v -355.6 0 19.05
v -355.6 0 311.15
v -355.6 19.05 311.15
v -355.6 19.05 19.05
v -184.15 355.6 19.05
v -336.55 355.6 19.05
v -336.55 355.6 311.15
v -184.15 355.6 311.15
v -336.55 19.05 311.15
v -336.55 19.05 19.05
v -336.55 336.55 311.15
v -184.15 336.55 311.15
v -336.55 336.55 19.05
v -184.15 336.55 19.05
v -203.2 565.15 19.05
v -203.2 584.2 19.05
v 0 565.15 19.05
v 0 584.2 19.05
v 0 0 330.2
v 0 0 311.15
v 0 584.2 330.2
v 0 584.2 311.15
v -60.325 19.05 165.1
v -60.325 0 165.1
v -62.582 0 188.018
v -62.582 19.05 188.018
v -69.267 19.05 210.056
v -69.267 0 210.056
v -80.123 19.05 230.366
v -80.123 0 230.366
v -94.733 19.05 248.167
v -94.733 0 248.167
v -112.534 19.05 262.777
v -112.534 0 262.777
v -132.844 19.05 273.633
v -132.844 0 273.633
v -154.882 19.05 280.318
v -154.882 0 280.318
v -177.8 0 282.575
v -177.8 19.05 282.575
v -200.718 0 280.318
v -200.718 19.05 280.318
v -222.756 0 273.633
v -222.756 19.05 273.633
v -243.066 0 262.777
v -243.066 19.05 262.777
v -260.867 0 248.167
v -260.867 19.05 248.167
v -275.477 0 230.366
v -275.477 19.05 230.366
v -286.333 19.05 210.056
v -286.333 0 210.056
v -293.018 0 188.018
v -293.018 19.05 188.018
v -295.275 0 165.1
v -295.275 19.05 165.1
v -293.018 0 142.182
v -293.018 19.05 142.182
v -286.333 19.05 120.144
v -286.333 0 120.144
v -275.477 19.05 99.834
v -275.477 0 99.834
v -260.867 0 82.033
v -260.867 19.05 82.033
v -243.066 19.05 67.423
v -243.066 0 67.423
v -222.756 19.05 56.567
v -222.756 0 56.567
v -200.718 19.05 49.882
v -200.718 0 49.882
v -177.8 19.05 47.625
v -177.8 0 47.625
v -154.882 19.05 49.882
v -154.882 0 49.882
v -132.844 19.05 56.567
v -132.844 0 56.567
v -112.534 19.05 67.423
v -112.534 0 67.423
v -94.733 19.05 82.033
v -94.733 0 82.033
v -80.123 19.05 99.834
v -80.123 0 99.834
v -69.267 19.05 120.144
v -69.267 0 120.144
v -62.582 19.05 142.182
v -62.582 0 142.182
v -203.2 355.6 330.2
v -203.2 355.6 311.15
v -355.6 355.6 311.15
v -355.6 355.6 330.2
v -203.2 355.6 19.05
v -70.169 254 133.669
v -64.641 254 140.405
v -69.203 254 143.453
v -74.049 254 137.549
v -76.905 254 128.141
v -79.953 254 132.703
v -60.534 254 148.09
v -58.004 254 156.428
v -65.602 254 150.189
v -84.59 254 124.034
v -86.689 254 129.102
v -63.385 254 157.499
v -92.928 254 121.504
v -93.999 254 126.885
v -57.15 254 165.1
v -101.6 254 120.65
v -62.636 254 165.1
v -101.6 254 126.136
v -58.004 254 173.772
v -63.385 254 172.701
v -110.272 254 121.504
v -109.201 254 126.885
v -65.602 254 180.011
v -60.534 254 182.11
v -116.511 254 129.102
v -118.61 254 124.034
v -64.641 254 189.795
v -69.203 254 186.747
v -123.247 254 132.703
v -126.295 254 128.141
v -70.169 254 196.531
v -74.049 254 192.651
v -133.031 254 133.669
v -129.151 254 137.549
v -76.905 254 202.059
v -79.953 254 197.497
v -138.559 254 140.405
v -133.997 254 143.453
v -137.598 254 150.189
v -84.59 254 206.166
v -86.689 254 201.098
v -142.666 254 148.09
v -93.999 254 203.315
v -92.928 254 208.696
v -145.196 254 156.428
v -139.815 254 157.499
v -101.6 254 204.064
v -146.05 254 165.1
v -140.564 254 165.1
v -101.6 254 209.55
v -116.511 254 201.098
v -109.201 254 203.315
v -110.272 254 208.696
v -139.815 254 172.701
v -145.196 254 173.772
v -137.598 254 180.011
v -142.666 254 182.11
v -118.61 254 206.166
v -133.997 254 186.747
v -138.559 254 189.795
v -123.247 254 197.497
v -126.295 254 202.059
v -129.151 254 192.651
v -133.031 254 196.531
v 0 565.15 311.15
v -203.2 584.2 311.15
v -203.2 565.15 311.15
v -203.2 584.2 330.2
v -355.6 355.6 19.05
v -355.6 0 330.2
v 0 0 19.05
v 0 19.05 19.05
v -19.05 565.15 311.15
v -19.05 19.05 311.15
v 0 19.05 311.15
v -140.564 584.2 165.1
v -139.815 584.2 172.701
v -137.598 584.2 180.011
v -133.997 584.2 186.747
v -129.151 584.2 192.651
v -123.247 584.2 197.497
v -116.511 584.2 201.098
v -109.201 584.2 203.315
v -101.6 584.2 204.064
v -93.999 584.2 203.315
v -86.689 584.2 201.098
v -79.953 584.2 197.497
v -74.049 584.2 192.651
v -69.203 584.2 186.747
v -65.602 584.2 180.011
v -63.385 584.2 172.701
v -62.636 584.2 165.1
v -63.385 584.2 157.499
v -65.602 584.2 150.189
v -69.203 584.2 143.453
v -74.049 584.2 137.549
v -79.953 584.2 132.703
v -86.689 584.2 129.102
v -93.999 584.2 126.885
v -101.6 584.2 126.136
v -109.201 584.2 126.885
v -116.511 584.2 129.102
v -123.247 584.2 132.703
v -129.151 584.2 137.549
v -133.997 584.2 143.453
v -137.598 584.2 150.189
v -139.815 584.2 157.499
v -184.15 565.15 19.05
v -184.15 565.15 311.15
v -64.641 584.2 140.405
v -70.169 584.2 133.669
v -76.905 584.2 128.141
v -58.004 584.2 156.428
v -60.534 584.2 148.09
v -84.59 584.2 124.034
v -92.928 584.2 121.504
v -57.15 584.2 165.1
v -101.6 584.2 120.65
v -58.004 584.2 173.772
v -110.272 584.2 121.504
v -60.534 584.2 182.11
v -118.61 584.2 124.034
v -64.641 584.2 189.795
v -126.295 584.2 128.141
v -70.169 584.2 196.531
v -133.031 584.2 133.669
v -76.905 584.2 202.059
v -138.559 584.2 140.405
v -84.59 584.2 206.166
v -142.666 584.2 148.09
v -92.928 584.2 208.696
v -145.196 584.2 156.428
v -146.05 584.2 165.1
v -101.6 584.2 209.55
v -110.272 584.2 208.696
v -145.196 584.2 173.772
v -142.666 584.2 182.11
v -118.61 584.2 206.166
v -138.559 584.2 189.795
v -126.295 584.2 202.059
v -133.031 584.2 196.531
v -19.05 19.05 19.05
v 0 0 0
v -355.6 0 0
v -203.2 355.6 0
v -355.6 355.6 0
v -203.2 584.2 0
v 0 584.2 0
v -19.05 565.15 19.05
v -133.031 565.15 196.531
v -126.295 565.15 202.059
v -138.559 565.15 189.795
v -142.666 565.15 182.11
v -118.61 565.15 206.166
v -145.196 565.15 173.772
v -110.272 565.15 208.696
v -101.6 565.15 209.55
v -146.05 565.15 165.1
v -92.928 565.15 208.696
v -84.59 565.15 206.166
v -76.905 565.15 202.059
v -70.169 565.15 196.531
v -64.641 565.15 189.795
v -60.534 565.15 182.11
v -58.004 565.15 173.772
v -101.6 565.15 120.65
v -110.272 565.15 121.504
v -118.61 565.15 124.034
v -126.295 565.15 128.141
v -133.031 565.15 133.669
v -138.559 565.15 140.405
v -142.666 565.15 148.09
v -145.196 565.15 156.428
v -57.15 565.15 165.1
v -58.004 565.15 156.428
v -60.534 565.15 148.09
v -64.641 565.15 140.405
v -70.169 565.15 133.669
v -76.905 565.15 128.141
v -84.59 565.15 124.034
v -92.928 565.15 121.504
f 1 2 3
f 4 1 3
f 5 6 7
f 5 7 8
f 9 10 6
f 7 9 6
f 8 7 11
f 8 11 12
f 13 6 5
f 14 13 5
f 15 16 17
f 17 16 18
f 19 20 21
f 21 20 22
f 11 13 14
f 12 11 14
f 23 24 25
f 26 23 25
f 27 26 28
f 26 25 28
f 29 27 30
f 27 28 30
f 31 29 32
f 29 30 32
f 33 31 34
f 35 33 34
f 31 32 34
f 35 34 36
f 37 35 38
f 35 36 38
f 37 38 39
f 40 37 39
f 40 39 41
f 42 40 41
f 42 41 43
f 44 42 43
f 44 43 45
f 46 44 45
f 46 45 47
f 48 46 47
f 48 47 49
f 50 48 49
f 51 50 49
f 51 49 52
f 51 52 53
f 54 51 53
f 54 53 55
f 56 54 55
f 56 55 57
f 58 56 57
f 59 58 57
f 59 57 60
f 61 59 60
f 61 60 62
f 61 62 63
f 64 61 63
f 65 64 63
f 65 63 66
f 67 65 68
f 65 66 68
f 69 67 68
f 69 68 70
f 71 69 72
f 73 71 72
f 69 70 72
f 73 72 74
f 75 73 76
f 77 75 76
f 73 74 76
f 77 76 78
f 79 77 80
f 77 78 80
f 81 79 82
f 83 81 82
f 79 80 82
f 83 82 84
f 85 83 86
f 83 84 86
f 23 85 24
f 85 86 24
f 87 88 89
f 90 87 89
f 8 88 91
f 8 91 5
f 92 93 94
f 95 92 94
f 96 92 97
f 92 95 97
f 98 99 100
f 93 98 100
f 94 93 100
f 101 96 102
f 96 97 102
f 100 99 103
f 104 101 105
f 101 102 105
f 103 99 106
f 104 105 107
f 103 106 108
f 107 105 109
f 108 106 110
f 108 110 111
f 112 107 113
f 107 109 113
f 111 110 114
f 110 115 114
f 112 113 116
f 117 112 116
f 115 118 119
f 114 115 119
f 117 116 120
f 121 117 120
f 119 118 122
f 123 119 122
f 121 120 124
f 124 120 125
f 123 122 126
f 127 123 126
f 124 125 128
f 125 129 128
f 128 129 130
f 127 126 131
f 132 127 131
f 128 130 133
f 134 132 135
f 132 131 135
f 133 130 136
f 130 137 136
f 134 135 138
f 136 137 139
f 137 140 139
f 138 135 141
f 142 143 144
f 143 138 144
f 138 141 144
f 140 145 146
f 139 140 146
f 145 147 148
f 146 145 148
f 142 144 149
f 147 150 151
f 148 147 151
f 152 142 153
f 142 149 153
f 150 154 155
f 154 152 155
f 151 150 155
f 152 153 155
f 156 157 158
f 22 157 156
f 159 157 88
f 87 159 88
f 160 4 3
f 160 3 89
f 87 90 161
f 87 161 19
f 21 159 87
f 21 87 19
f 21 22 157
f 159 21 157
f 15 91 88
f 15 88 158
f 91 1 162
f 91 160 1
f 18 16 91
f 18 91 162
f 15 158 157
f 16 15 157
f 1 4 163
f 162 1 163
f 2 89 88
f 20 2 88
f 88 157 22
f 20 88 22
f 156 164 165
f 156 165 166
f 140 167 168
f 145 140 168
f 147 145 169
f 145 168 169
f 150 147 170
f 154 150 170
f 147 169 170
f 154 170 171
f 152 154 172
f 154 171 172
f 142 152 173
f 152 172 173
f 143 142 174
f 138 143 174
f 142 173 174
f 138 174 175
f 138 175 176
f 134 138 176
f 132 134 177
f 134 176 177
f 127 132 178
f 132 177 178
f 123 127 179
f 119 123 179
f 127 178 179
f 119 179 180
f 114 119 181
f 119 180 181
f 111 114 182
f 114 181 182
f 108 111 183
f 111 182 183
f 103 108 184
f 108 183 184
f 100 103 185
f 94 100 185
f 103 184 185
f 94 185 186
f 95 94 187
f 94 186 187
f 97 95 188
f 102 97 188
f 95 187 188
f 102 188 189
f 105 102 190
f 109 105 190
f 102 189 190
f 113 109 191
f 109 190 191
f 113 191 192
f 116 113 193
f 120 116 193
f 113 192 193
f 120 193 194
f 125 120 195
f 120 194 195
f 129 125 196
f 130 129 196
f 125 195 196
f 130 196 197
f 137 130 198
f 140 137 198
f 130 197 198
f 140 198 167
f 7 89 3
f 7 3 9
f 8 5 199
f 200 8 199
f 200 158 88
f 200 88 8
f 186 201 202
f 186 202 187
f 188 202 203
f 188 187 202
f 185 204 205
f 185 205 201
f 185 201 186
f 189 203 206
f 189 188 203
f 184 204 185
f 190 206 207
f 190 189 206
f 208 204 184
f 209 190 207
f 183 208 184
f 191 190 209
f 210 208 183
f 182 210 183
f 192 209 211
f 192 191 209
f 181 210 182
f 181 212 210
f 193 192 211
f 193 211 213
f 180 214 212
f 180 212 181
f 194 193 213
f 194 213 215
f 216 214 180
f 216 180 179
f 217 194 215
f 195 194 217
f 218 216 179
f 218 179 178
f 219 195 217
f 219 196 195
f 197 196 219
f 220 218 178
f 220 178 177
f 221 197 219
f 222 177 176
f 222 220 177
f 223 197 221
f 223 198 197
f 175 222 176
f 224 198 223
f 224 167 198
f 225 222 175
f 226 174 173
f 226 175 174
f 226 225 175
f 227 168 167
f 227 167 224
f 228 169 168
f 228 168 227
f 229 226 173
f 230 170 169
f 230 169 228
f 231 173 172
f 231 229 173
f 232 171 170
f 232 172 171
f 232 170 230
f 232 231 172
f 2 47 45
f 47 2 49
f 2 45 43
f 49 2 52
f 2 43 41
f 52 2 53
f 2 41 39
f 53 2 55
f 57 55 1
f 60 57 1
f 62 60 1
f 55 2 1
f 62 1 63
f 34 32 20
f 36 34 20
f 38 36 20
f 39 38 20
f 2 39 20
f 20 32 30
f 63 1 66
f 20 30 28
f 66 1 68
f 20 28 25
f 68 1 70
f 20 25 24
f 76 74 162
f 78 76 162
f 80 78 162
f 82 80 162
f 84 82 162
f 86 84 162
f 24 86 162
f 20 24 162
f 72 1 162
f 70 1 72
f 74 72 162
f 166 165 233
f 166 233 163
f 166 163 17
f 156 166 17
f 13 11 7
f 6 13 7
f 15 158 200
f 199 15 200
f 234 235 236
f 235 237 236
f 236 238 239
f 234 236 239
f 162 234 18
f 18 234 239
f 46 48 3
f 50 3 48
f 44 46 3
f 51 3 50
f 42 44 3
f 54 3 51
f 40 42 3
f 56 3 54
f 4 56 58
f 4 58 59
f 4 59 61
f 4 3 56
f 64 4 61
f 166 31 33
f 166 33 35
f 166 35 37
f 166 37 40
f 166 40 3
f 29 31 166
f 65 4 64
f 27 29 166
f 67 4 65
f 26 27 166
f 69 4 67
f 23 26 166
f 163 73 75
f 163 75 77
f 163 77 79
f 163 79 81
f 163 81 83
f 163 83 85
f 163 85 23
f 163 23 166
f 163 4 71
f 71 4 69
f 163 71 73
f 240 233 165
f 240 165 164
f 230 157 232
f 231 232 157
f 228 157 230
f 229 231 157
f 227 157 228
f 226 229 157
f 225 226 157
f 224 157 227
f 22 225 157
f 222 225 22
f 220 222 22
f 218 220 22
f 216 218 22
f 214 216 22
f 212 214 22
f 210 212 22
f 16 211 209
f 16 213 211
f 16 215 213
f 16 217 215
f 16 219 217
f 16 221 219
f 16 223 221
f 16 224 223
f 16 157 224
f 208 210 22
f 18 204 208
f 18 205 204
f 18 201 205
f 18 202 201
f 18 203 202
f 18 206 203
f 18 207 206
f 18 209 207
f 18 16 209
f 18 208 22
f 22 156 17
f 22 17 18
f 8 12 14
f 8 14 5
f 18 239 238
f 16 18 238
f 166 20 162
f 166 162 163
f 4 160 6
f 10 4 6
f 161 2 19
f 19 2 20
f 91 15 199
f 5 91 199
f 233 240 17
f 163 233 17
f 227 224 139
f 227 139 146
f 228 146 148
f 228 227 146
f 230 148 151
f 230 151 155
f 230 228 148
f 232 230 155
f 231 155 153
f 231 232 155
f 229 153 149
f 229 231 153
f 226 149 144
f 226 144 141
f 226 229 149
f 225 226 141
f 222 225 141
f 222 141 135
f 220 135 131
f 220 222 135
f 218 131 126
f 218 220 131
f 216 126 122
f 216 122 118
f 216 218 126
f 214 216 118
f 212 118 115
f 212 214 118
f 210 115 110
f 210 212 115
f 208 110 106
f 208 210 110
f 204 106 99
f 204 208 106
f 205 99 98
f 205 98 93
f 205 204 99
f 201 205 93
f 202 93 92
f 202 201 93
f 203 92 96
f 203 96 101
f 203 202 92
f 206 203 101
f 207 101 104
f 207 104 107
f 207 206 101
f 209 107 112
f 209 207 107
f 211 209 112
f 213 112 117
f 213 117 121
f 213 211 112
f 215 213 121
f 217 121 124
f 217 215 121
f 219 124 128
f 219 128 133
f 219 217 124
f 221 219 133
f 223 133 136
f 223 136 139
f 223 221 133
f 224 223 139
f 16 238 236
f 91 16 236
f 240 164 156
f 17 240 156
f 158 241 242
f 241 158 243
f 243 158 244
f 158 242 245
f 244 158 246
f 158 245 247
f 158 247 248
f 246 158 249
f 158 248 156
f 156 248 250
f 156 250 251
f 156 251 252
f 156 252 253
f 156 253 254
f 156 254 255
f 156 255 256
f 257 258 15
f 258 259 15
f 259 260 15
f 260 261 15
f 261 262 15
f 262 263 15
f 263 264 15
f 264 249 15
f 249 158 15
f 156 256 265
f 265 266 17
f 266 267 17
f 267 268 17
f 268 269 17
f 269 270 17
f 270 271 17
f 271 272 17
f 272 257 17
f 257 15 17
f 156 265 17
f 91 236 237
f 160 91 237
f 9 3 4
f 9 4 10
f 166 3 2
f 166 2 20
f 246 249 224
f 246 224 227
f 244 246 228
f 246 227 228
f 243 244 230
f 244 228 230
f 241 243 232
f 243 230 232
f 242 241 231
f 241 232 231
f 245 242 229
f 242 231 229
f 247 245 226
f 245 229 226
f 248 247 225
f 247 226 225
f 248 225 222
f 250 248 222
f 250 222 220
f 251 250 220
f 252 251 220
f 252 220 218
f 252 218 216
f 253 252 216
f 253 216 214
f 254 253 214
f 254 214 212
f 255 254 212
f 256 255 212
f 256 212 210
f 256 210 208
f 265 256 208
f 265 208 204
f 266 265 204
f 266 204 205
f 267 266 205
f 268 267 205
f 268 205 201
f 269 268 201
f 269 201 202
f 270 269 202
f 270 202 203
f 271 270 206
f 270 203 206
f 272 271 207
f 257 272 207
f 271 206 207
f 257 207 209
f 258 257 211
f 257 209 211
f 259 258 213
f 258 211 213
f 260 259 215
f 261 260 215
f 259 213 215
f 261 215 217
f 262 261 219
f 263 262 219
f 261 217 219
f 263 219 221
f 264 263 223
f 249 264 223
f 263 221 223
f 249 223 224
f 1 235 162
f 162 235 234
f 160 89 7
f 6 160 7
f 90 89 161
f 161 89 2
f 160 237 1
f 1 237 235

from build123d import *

# Parameters (mm, degrees)
F1_DEPTH  = 19.05
F2_W      = 355.6
F2_H      = 19.05
F3_DEPTH  = 292.1
F4_W      = 203.2
F4_H      = 19.05
F5_DEPTH  = 292.1
F6_W      = 19.05
F6_H      = 546.1
F7_DEPTH  = 292.1
F8_W      = 19.05
F8_H      = 336.55
F9_DEPTH  = 292.1
F10_W     = 19.05
F10_H     = 209.55
F11_DEPTH = 292.1
F12_W     = 152.4
F12_H     = 19.05
F13_DEPTH = 292.1
F15_DEPTH = 19.05
F16_R     = 117.475
F17_DEPTH = 584.201
F18_R     = 44.45
F19_DEPTH = 584.201
F20_R     = 44.45
F20_R_2   = 38.9636
F21_DEPTH = 330.2


with BuildPart() as f1:
    # F0 (on Top) → F1 (new body)
    with BuildSketch(Plane.XY):
        Polygon((-355.6, 0), (0, 0), (0, 584.2), (-203.2, 584.2), (-203.2, 355.6), (-355.6, 355.6), align=None)
    extrude(amount=F1_DEPTH)


with BuildPart() as f3:
    # F2 (on face) → F3 (new body)
    with BuildSketch(Plane.XY.offset(19.05)):
        with Locations((-177.8, 9.525)):
            Rectangle(F2_W, F2_H)
    extrude(amount=F3_DEPTH)

    # F16 (on face) → F17 (cut, through all)
    with BuildSketch(Plane.XZ):
        with Locations((-177.8, 165.1)):
            Circle(F16_R)
    extrude(amount=-F17_DEPTH, mode=Mode.SUBTRACT)


with BuildPart() as f5:
    # F4 (on face) → F5 (new body, through all)
    with BuildSketch(Plane.XY.offset(19.05)):
        with Locations((-101.6, 574.675)):
            Rectangle(F4_W, F4_H)
    extrude(amount=F5_DEPTH)

    # F18 (on face) → F19 (cut, through all)
    with BuildSketch(Plane(origin=(0, 584.2, 0), x_dir=(-1, 0, 0), z_dir=(0, 1, 0))):
        with Locations((101.6, 165.1)):
            Circle(F18_R)
    extrude(amount=-F19_DEPTH, mode=Mode.SUBTRACT)


with BuildPart() as f7:
    # F6 (on face) → F7 (new body, through all)
    with BuildSketch(Plane.XY.offset(19.05)):
        with Locations((-9.525, 292.1)):
            Rectangle(F6_W, F6_H)
    extrude(amount=F7_DEPTH)


with BuildPart() as f9:
    # F8 (on face) → F9 (new body, through all)
    with BuildSketch(Plane.XY.offset(19.05)):
        with Locations((-346.075, 187.325)):
            Rectangle(F8_W, F8_H)
    extrude(amount=F9_DEPTH)


with BuildPart() as f11:
    # F10 (on face) → F11 (new body, through all)
    with BuildSketch(Plane.XY.offset(19.05)):
        with Locations((-193.675, 460.375)):
            Rectangle(F10_W, F10_H)
    extrude(amount=F11_DEPTH)


with BuildPart() as f13:
    # F12 (on face) → F13 (new body, through all)
    with BuildSketch(Plane.XY.offset(19.05)):
        with Locations((-260.35, 346.075)):
            Rectangle(F12_W, F12_H)
    extrude(amount=F13_DEPTH)


with BuildPart() as f15:
    # F14 (on face) → F15 (new body)
    with BuildSketch(Plane.XY.offset(311.15)):
        Polygon((0, 0), (0, 584.2), (-203.2, 584.2), (-203.2, 355.6), (-355.6, 355.6), (-355.6, 0), align=None)
    extrude(amount=F15_DEPTH)


with BuildPart() as f21:
    # F20 (on face) → F21 (new body)
    with BuildSketch(Plane(origin=(0, 584.2, 0), x_dir=(-1, 0, 0), z_dir=(0, 1, 0))):
        with Locations((101.6, 165.1)):
            Circle(F20_R)
        with Locations((101.6, 165.1)):
            Circle(F20_R_2, mode=Mode.SUBTRACT)
    extrude(amount=-F21_DEPTH)


solid = Compound([f1.part, f3.part, f5.part, f7.part, f9.part, f11.part, f13.part, f15.part, f21.part])
